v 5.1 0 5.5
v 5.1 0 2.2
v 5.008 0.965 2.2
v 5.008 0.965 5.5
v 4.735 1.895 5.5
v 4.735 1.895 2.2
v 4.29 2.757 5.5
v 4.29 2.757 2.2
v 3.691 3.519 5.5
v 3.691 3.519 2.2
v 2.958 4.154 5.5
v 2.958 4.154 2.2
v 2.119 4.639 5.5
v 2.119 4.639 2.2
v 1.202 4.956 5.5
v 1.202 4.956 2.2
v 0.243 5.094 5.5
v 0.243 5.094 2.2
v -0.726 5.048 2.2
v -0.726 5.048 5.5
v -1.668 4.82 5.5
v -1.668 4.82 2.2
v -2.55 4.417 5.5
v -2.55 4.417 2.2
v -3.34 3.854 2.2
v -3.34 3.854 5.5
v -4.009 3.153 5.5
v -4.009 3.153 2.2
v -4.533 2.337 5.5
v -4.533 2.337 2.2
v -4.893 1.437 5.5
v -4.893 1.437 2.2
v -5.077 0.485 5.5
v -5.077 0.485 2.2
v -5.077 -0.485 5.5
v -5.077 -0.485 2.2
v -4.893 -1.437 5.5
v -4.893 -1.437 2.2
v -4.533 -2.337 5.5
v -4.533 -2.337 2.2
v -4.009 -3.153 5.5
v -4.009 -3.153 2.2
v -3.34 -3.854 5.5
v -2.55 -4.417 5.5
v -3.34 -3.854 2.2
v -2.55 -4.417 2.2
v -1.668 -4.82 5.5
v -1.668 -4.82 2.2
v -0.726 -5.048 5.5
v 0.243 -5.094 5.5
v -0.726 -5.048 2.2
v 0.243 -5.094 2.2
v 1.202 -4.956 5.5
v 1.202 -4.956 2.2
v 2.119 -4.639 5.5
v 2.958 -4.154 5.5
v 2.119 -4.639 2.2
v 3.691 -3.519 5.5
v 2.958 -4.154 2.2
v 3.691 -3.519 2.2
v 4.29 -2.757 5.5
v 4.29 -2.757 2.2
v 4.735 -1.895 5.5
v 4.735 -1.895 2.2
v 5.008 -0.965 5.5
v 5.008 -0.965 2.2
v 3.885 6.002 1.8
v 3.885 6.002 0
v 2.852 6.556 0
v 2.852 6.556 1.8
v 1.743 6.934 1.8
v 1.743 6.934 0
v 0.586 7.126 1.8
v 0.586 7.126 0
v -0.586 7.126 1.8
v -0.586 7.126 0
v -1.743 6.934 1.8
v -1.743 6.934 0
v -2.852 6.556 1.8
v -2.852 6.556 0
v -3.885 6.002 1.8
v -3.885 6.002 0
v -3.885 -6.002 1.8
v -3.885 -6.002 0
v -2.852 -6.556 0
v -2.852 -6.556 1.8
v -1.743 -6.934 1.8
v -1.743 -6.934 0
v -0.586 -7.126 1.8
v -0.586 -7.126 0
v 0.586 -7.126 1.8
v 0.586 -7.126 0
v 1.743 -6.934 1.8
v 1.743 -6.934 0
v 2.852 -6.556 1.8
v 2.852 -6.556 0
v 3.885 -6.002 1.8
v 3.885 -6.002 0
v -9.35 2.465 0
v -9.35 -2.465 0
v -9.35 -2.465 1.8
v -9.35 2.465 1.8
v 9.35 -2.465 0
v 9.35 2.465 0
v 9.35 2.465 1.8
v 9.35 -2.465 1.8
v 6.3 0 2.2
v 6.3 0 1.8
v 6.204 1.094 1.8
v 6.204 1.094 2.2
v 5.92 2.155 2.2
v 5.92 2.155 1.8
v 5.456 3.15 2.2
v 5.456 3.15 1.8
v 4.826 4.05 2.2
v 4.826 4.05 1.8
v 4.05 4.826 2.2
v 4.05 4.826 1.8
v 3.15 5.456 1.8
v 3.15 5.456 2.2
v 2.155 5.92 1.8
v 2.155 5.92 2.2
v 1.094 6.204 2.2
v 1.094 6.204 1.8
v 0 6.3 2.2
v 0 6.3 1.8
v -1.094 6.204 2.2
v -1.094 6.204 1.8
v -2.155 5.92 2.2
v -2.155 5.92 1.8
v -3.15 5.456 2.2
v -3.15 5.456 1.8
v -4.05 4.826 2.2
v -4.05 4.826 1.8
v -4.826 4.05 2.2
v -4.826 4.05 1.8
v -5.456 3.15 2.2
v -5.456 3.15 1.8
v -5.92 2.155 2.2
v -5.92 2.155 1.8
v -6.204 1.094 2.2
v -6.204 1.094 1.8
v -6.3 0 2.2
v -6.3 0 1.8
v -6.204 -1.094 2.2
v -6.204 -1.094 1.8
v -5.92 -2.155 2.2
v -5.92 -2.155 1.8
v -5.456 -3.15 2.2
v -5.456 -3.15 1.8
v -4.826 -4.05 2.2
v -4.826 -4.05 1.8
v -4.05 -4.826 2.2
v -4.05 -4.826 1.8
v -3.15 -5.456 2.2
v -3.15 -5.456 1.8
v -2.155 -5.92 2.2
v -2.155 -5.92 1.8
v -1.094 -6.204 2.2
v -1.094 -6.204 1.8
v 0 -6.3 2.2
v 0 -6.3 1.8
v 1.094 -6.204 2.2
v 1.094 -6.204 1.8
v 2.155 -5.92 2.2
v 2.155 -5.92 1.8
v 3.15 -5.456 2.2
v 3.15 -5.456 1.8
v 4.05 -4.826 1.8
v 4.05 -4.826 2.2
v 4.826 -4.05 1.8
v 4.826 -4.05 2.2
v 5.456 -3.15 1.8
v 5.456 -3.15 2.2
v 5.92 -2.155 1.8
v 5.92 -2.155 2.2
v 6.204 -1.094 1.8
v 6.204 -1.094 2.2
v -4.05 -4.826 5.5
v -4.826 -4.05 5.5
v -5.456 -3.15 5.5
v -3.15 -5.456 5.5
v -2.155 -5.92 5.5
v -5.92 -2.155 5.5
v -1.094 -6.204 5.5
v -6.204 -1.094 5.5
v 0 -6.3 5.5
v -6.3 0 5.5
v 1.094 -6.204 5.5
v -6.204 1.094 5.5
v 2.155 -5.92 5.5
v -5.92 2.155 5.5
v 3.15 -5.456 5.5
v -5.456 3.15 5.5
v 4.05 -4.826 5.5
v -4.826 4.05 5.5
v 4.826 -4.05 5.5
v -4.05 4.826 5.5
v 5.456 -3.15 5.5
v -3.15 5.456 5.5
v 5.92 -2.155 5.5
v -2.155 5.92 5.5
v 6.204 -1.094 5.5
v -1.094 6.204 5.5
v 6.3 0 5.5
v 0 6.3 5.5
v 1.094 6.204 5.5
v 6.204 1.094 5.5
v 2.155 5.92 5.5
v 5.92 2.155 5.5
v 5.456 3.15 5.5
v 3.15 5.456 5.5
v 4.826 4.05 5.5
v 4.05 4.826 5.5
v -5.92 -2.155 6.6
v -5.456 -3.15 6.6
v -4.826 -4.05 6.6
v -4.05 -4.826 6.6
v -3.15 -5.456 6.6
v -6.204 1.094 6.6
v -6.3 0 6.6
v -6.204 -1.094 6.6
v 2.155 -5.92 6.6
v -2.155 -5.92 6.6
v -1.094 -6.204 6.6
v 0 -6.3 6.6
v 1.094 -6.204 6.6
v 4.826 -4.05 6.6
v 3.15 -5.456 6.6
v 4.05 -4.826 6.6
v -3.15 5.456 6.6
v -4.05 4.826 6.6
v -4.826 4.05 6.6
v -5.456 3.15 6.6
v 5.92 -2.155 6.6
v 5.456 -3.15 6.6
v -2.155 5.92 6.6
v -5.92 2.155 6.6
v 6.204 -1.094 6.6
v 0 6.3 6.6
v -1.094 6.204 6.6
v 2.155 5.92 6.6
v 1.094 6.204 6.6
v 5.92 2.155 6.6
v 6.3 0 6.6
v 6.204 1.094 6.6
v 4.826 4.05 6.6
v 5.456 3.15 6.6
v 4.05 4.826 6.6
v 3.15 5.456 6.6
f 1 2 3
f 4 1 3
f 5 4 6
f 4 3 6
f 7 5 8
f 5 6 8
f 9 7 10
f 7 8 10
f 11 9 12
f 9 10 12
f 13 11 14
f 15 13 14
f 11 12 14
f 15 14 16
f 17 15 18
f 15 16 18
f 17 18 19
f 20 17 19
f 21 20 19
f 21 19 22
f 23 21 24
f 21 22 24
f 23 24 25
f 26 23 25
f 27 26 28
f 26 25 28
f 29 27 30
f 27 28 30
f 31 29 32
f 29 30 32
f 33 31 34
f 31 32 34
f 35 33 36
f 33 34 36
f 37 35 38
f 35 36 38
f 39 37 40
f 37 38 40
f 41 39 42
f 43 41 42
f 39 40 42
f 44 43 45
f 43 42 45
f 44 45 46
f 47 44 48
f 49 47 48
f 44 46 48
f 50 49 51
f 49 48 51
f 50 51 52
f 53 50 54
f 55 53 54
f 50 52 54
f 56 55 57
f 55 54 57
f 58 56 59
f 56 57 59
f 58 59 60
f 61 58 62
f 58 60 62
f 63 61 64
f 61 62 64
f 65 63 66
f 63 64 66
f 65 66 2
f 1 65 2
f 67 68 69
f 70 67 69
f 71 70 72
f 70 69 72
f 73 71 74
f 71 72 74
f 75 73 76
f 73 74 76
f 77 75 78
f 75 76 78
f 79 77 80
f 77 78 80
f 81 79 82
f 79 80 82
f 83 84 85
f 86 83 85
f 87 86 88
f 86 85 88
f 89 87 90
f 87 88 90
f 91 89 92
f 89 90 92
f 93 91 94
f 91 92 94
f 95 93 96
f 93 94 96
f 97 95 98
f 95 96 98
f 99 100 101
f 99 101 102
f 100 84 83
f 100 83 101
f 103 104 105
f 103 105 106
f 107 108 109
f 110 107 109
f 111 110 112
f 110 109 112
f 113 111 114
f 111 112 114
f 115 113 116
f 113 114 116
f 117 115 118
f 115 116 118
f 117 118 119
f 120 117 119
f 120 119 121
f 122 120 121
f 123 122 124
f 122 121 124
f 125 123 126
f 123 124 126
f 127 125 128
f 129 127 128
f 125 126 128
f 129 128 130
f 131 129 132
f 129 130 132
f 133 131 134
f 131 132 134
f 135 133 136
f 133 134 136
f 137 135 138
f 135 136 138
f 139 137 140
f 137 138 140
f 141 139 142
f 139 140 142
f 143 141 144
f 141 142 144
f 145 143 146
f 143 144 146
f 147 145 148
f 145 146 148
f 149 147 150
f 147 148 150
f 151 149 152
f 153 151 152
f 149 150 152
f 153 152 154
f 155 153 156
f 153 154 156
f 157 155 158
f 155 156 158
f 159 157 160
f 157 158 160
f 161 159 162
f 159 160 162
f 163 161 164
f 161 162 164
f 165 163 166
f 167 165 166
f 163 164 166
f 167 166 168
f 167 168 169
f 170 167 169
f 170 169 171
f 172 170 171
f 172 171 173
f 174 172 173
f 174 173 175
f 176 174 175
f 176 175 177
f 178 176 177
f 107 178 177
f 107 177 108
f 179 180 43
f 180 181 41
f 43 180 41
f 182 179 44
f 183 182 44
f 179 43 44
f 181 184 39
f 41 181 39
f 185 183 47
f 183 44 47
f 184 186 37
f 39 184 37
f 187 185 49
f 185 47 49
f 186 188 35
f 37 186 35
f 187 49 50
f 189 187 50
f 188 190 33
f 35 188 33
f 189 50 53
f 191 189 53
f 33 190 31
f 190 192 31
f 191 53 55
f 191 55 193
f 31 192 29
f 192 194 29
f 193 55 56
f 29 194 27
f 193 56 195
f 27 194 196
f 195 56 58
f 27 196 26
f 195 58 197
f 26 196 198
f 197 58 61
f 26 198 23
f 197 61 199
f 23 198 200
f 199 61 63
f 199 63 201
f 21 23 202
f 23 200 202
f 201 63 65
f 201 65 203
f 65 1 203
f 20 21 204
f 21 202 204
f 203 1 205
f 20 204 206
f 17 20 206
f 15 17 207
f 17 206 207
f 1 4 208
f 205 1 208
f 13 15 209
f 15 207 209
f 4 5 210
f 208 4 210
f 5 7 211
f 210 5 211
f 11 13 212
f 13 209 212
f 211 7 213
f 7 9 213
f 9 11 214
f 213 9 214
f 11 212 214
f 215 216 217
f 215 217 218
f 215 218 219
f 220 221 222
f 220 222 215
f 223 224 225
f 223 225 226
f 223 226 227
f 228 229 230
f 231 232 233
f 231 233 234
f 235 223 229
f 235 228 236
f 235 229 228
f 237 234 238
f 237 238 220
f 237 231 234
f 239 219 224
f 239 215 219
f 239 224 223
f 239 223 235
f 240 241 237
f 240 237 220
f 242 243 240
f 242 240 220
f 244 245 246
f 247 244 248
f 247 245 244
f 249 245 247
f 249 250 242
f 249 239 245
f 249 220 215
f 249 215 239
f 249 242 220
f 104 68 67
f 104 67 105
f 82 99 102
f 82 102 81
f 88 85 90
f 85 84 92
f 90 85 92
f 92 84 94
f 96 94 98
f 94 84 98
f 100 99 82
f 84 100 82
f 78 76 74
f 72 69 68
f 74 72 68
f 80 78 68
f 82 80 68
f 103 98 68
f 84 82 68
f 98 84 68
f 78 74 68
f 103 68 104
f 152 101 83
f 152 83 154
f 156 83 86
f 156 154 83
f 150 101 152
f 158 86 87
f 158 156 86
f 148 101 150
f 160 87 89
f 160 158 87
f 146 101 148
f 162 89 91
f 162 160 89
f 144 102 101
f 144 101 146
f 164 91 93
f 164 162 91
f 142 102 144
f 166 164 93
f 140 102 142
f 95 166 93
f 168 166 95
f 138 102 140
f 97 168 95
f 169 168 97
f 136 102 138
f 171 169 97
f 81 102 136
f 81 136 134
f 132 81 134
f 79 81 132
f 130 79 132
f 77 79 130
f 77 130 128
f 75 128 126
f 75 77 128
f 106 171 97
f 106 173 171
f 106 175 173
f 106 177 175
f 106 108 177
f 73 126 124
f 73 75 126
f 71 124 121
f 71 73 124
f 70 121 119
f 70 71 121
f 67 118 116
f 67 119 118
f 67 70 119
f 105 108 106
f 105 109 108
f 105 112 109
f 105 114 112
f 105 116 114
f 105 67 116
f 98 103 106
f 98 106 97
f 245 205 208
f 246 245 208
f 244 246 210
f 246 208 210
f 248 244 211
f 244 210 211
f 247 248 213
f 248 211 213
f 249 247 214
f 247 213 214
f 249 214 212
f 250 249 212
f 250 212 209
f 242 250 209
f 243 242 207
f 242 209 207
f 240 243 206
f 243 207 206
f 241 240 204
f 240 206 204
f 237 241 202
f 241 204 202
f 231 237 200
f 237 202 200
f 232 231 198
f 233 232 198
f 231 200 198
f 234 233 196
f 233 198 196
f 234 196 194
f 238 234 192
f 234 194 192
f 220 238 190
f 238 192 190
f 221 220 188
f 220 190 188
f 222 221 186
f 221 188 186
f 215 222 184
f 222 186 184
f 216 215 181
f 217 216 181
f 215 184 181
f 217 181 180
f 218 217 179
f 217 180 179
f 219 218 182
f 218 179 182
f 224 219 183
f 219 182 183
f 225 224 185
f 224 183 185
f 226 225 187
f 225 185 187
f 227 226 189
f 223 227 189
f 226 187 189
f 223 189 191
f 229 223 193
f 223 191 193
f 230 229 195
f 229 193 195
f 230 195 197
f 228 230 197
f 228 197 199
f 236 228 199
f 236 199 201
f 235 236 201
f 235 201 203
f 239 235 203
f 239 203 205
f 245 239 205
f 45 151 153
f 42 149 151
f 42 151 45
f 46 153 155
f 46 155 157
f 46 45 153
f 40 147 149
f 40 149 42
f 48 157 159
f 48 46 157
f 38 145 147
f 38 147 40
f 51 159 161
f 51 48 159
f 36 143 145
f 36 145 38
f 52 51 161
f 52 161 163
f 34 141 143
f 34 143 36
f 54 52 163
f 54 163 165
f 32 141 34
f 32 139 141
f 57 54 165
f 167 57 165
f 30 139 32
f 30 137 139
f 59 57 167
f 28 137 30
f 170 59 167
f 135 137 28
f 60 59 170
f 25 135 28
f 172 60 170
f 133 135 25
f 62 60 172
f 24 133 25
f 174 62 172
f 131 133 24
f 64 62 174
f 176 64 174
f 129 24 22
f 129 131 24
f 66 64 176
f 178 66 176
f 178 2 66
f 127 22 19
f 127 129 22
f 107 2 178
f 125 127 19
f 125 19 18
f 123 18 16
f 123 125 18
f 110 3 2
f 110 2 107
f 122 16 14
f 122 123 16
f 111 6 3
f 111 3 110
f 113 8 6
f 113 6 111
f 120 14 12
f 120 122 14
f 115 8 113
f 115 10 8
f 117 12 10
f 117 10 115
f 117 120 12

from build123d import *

# Parameters (mm, degrees)
PAD_DEPTH    = 1.8
SKETCH001_R  = 6.3
PAD001_DEPTH = 0.4
SKETCH002_R  = 5.1
PAD002_DEPTH = 3.3
SKETCH003_R  = 6.3
PAD003_DEPTH = 1.1


with BuildPart() as part:
    # Sketch → Pad (new body)
    with BuildSketch(Plane.XY):
        with BuildLine():
            ThreePointArc((3.885224, 6.002294), (0, 7.15), (-3.885224, 6.002294))
            Line((-9.35, 2.465), (-3.885224, 6.002294))
            Line((-9.35, -2.465), (-9.35, 2.465))
            Line((-3.885224, -6.002294), (-9.35, -2.465))
            ThreePointArc((-3.885224, -6.002294), (0, -7.15), (3.885224, -6.002294))
            Line((9.35, -2.465), (3.885224, -6.002294))
            Line((9.35, 2.465), (9.35, -2.465))
            Line((3.885224, 6.002294), (9.35, 2.465))
        make_face()
    extrude(amount=PAD_DEPTH)

    # Sketch001 (on Face5 of Pad003) → Pad001 (join)
    with BuildSketch(Plane.XY.offset(1.8)):
        Circle(SKETCH001_R)
    extrude(amount=PAD001_DEPTH)

    # Sketch002 (on Face12 of Pad001) → Pad002 (join)
    with BuildSketch(Plane.XY.offset(2.2)):
        Circle(SKETCH002_R)
    extrude(amount=PAD002_DEPTH)

    # Sketch003 (on Face14 of Pad002) → Pad003 (join)
    with BuildSketch(Plane.XY.offset(5.5)):
        Circle(SKETCH003_R)
    extrude(amount=PAD003_DEPTH)


solid = part.part
